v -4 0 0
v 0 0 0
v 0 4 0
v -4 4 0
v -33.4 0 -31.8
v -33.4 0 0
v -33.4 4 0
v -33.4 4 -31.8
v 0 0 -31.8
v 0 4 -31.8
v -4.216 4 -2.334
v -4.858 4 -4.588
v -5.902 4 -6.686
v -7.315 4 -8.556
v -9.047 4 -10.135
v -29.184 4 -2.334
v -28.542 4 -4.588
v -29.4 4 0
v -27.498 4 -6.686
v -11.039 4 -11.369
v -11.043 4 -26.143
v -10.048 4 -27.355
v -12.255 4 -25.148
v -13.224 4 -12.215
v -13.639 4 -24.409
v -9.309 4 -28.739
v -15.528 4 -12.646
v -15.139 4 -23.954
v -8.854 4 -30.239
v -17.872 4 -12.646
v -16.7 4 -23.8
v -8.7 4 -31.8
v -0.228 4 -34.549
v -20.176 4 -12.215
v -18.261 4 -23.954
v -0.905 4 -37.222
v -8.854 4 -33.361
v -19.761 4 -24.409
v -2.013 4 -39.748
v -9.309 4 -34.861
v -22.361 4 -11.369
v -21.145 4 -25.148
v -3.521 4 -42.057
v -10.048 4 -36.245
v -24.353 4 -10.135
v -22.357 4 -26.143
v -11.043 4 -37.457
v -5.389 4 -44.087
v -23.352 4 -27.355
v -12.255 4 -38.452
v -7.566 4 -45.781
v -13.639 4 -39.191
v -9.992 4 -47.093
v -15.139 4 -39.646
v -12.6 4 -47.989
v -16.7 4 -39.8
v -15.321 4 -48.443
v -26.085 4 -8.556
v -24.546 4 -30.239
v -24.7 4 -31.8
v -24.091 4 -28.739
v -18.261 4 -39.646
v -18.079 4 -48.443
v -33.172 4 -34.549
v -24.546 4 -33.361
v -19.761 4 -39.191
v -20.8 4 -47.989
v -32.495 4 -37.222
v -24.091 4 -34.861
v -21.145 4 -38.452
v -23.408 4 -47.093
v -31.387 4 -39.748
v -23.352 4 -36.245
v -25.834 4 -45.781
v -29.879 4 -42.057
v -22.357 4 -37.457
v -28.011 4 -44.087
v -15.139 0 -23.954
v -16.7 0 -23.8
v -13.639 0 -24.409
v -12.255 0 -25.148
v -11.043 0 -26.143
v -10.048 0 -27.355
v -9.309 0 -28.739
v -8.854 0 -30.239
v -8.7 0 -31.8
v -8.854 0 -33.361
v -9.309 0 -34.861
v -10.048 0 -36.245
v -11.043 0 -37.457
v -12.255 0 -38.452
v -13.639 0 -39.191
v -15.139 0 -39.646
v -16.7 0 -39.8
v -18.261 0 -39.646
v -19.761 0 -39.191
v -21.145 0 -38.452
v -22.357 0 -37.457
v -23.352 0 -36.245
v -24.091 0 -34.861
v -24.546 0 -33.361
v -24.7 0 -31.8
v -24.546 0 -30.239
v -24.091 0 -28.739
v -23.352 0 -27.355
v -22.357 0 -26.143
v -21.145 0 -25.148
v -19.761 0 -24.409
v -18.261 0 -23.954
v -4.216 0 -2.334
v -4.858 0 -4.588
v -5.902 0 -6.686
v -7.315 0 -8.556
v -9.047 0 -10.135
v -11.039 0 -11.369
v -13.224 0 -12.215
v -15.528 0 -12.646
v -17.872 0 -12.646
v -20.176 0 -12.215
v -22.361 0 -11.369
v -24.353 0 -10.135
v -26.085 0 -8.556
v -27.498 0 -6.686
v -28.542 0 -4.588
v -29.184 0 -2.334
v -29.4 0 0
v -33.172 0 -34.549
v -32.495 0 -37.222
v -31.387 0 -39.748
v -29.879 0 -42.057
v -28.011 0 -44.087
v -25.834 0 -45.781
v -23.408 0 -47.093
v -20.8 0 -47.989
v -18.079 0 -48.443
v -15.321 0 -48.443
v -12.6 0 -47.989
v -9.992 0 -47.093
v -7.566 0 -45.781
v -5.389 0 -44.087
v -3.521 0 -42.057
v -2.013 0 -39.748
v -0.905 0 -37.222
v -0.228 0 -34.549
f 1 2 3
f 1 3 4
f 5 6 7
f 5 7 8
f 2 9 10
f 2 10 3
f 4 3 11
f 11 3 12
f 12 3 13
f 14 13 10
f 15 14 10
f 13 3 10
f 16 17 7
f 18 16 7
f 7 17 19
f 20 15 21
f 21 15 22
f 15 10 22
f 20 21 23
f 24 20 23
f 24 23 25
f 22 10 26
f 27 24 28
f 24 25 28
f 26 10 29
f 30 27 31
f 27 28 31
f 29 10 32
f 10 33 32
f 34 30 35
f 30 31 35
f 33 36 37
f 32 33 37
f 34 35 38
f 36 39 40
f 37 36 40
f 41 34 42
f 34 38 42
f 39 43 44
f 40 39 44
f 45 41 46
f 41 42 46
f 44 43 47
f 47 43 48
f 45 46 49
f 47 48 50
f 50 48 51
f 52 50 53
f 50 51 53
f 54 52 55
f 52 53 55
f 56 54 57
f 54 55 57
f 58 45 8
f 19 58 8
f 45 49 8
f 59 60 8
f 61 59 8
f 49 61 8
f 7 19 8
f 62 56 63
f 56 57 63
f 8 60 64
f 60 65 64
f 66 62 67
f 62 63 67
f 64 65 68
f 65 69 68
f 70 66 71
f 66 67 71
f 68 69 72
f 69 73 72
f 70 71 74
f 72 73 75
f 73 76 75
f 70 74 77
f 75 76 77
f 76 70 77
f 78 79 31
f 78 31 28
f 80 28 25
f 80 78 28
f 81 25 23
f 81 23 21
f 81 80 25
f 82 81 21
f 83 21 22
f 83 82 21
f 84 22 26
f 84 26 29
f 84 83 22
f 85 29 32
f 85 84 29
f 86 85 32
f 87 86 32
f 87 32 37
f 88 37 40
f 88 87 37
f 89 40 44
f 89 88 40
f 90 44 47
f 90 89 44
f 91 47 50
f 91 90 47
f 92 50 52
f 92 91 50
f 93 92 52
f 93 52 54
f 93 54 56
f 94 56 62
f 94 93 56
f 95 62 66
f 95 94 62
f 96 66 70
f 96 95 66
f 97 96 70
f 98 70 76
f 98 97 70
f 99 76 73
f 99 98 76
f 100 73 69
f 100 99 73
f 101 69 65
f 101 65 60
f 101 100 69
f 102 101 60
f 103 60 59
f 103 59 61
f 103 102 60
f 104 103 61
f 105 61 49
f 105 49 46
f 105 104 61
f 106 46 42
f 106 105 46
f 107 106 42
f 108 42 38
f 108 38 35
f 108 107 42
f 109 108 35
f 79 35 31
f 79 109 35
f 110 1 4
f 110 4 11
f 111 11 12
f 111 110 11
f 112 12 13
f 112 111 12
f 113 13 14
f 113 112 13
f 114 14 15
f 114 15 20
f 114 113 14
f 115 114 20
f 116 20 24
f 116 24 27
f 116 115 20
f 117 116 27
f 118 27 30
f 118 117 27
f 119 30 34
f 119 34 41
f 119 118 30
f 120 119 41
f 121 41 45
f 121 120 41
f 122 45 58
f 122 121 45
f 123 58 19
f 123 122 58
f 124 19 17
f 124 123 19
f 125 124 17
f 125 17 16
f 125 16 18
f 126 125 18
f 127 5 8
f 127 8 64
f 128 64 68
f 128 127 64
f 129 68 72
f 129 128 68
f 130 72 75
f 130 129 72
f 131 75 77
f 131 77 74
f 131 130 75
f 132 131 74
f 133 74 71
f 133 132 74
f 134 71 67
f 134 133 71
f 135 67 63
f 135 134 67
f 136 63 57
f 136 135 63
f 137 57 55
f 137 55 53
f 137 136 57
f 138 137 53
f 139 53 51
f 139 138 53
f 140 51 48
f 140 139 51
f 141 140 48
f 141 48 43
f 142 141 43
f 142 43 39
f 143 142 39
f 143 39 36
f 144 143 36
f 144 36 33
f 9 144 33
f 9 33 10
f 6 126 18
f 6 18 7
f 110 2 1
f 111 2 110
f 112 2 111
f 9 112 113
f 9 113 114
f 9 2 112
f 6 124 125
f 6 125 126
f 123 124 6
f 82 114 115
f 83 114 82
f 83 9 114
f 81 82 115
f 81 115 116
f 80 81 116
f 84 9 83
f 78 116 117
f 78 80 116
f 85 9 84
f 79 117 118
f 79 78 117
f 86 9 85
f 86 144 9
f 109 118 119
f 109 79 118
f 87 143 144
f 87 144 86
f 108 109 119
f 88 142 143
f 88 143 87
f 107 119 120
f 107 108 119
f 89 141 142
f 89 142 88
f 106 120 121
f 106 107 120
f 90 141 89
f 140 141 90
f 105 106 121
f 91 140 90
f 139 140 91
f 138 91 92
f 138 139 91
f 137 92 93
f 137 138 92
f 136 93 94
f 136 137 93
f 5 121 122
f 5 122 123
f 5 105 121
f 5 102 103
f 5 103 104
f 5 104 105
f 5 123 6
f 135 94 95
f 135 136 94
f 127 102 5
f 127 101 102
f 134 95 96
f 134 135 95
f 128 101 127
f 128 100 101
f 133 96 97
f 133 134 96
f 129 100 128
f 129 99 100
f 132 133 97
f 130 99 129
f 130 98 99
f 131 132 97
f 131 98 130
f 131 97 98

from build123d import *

# Parameters (mm, degrees)
SKETCH1_R           = 8
BOSS_EXTRUDE1_DEPTH = 4


with BuildPart() as part:
    # Sketch1 → Boss-Extrude1 (new body)
    with BuildSketch(Plane(origin=(0, 0, 0), x_dir=(1, 0, 0), z_dir=(0, 1, 0))):
        with BuildLine():
            Line((0, 0), (-4, 0))
            ThreePointArc((-4, 0), (-16.7, 12.7), (-29.4, 0))
            Line((-29.4, 0), (-33.4, 0))
            Line((-33.4, 0), (-33.4, 31.8))
            ThreePointArc((-33.4, 31.8), (-16.7, 48.5), (0, 31.8))
            Line((0, 31.8), (0, 0))
        make_face()
        with Locations((-16.7, 31.8)):
            Circle(SKETCH1_R, mode=Mode.SUBTRACT)
    extrude(amount=BOSS_EXTRUDE1_DEPTH)


solid = part.part
